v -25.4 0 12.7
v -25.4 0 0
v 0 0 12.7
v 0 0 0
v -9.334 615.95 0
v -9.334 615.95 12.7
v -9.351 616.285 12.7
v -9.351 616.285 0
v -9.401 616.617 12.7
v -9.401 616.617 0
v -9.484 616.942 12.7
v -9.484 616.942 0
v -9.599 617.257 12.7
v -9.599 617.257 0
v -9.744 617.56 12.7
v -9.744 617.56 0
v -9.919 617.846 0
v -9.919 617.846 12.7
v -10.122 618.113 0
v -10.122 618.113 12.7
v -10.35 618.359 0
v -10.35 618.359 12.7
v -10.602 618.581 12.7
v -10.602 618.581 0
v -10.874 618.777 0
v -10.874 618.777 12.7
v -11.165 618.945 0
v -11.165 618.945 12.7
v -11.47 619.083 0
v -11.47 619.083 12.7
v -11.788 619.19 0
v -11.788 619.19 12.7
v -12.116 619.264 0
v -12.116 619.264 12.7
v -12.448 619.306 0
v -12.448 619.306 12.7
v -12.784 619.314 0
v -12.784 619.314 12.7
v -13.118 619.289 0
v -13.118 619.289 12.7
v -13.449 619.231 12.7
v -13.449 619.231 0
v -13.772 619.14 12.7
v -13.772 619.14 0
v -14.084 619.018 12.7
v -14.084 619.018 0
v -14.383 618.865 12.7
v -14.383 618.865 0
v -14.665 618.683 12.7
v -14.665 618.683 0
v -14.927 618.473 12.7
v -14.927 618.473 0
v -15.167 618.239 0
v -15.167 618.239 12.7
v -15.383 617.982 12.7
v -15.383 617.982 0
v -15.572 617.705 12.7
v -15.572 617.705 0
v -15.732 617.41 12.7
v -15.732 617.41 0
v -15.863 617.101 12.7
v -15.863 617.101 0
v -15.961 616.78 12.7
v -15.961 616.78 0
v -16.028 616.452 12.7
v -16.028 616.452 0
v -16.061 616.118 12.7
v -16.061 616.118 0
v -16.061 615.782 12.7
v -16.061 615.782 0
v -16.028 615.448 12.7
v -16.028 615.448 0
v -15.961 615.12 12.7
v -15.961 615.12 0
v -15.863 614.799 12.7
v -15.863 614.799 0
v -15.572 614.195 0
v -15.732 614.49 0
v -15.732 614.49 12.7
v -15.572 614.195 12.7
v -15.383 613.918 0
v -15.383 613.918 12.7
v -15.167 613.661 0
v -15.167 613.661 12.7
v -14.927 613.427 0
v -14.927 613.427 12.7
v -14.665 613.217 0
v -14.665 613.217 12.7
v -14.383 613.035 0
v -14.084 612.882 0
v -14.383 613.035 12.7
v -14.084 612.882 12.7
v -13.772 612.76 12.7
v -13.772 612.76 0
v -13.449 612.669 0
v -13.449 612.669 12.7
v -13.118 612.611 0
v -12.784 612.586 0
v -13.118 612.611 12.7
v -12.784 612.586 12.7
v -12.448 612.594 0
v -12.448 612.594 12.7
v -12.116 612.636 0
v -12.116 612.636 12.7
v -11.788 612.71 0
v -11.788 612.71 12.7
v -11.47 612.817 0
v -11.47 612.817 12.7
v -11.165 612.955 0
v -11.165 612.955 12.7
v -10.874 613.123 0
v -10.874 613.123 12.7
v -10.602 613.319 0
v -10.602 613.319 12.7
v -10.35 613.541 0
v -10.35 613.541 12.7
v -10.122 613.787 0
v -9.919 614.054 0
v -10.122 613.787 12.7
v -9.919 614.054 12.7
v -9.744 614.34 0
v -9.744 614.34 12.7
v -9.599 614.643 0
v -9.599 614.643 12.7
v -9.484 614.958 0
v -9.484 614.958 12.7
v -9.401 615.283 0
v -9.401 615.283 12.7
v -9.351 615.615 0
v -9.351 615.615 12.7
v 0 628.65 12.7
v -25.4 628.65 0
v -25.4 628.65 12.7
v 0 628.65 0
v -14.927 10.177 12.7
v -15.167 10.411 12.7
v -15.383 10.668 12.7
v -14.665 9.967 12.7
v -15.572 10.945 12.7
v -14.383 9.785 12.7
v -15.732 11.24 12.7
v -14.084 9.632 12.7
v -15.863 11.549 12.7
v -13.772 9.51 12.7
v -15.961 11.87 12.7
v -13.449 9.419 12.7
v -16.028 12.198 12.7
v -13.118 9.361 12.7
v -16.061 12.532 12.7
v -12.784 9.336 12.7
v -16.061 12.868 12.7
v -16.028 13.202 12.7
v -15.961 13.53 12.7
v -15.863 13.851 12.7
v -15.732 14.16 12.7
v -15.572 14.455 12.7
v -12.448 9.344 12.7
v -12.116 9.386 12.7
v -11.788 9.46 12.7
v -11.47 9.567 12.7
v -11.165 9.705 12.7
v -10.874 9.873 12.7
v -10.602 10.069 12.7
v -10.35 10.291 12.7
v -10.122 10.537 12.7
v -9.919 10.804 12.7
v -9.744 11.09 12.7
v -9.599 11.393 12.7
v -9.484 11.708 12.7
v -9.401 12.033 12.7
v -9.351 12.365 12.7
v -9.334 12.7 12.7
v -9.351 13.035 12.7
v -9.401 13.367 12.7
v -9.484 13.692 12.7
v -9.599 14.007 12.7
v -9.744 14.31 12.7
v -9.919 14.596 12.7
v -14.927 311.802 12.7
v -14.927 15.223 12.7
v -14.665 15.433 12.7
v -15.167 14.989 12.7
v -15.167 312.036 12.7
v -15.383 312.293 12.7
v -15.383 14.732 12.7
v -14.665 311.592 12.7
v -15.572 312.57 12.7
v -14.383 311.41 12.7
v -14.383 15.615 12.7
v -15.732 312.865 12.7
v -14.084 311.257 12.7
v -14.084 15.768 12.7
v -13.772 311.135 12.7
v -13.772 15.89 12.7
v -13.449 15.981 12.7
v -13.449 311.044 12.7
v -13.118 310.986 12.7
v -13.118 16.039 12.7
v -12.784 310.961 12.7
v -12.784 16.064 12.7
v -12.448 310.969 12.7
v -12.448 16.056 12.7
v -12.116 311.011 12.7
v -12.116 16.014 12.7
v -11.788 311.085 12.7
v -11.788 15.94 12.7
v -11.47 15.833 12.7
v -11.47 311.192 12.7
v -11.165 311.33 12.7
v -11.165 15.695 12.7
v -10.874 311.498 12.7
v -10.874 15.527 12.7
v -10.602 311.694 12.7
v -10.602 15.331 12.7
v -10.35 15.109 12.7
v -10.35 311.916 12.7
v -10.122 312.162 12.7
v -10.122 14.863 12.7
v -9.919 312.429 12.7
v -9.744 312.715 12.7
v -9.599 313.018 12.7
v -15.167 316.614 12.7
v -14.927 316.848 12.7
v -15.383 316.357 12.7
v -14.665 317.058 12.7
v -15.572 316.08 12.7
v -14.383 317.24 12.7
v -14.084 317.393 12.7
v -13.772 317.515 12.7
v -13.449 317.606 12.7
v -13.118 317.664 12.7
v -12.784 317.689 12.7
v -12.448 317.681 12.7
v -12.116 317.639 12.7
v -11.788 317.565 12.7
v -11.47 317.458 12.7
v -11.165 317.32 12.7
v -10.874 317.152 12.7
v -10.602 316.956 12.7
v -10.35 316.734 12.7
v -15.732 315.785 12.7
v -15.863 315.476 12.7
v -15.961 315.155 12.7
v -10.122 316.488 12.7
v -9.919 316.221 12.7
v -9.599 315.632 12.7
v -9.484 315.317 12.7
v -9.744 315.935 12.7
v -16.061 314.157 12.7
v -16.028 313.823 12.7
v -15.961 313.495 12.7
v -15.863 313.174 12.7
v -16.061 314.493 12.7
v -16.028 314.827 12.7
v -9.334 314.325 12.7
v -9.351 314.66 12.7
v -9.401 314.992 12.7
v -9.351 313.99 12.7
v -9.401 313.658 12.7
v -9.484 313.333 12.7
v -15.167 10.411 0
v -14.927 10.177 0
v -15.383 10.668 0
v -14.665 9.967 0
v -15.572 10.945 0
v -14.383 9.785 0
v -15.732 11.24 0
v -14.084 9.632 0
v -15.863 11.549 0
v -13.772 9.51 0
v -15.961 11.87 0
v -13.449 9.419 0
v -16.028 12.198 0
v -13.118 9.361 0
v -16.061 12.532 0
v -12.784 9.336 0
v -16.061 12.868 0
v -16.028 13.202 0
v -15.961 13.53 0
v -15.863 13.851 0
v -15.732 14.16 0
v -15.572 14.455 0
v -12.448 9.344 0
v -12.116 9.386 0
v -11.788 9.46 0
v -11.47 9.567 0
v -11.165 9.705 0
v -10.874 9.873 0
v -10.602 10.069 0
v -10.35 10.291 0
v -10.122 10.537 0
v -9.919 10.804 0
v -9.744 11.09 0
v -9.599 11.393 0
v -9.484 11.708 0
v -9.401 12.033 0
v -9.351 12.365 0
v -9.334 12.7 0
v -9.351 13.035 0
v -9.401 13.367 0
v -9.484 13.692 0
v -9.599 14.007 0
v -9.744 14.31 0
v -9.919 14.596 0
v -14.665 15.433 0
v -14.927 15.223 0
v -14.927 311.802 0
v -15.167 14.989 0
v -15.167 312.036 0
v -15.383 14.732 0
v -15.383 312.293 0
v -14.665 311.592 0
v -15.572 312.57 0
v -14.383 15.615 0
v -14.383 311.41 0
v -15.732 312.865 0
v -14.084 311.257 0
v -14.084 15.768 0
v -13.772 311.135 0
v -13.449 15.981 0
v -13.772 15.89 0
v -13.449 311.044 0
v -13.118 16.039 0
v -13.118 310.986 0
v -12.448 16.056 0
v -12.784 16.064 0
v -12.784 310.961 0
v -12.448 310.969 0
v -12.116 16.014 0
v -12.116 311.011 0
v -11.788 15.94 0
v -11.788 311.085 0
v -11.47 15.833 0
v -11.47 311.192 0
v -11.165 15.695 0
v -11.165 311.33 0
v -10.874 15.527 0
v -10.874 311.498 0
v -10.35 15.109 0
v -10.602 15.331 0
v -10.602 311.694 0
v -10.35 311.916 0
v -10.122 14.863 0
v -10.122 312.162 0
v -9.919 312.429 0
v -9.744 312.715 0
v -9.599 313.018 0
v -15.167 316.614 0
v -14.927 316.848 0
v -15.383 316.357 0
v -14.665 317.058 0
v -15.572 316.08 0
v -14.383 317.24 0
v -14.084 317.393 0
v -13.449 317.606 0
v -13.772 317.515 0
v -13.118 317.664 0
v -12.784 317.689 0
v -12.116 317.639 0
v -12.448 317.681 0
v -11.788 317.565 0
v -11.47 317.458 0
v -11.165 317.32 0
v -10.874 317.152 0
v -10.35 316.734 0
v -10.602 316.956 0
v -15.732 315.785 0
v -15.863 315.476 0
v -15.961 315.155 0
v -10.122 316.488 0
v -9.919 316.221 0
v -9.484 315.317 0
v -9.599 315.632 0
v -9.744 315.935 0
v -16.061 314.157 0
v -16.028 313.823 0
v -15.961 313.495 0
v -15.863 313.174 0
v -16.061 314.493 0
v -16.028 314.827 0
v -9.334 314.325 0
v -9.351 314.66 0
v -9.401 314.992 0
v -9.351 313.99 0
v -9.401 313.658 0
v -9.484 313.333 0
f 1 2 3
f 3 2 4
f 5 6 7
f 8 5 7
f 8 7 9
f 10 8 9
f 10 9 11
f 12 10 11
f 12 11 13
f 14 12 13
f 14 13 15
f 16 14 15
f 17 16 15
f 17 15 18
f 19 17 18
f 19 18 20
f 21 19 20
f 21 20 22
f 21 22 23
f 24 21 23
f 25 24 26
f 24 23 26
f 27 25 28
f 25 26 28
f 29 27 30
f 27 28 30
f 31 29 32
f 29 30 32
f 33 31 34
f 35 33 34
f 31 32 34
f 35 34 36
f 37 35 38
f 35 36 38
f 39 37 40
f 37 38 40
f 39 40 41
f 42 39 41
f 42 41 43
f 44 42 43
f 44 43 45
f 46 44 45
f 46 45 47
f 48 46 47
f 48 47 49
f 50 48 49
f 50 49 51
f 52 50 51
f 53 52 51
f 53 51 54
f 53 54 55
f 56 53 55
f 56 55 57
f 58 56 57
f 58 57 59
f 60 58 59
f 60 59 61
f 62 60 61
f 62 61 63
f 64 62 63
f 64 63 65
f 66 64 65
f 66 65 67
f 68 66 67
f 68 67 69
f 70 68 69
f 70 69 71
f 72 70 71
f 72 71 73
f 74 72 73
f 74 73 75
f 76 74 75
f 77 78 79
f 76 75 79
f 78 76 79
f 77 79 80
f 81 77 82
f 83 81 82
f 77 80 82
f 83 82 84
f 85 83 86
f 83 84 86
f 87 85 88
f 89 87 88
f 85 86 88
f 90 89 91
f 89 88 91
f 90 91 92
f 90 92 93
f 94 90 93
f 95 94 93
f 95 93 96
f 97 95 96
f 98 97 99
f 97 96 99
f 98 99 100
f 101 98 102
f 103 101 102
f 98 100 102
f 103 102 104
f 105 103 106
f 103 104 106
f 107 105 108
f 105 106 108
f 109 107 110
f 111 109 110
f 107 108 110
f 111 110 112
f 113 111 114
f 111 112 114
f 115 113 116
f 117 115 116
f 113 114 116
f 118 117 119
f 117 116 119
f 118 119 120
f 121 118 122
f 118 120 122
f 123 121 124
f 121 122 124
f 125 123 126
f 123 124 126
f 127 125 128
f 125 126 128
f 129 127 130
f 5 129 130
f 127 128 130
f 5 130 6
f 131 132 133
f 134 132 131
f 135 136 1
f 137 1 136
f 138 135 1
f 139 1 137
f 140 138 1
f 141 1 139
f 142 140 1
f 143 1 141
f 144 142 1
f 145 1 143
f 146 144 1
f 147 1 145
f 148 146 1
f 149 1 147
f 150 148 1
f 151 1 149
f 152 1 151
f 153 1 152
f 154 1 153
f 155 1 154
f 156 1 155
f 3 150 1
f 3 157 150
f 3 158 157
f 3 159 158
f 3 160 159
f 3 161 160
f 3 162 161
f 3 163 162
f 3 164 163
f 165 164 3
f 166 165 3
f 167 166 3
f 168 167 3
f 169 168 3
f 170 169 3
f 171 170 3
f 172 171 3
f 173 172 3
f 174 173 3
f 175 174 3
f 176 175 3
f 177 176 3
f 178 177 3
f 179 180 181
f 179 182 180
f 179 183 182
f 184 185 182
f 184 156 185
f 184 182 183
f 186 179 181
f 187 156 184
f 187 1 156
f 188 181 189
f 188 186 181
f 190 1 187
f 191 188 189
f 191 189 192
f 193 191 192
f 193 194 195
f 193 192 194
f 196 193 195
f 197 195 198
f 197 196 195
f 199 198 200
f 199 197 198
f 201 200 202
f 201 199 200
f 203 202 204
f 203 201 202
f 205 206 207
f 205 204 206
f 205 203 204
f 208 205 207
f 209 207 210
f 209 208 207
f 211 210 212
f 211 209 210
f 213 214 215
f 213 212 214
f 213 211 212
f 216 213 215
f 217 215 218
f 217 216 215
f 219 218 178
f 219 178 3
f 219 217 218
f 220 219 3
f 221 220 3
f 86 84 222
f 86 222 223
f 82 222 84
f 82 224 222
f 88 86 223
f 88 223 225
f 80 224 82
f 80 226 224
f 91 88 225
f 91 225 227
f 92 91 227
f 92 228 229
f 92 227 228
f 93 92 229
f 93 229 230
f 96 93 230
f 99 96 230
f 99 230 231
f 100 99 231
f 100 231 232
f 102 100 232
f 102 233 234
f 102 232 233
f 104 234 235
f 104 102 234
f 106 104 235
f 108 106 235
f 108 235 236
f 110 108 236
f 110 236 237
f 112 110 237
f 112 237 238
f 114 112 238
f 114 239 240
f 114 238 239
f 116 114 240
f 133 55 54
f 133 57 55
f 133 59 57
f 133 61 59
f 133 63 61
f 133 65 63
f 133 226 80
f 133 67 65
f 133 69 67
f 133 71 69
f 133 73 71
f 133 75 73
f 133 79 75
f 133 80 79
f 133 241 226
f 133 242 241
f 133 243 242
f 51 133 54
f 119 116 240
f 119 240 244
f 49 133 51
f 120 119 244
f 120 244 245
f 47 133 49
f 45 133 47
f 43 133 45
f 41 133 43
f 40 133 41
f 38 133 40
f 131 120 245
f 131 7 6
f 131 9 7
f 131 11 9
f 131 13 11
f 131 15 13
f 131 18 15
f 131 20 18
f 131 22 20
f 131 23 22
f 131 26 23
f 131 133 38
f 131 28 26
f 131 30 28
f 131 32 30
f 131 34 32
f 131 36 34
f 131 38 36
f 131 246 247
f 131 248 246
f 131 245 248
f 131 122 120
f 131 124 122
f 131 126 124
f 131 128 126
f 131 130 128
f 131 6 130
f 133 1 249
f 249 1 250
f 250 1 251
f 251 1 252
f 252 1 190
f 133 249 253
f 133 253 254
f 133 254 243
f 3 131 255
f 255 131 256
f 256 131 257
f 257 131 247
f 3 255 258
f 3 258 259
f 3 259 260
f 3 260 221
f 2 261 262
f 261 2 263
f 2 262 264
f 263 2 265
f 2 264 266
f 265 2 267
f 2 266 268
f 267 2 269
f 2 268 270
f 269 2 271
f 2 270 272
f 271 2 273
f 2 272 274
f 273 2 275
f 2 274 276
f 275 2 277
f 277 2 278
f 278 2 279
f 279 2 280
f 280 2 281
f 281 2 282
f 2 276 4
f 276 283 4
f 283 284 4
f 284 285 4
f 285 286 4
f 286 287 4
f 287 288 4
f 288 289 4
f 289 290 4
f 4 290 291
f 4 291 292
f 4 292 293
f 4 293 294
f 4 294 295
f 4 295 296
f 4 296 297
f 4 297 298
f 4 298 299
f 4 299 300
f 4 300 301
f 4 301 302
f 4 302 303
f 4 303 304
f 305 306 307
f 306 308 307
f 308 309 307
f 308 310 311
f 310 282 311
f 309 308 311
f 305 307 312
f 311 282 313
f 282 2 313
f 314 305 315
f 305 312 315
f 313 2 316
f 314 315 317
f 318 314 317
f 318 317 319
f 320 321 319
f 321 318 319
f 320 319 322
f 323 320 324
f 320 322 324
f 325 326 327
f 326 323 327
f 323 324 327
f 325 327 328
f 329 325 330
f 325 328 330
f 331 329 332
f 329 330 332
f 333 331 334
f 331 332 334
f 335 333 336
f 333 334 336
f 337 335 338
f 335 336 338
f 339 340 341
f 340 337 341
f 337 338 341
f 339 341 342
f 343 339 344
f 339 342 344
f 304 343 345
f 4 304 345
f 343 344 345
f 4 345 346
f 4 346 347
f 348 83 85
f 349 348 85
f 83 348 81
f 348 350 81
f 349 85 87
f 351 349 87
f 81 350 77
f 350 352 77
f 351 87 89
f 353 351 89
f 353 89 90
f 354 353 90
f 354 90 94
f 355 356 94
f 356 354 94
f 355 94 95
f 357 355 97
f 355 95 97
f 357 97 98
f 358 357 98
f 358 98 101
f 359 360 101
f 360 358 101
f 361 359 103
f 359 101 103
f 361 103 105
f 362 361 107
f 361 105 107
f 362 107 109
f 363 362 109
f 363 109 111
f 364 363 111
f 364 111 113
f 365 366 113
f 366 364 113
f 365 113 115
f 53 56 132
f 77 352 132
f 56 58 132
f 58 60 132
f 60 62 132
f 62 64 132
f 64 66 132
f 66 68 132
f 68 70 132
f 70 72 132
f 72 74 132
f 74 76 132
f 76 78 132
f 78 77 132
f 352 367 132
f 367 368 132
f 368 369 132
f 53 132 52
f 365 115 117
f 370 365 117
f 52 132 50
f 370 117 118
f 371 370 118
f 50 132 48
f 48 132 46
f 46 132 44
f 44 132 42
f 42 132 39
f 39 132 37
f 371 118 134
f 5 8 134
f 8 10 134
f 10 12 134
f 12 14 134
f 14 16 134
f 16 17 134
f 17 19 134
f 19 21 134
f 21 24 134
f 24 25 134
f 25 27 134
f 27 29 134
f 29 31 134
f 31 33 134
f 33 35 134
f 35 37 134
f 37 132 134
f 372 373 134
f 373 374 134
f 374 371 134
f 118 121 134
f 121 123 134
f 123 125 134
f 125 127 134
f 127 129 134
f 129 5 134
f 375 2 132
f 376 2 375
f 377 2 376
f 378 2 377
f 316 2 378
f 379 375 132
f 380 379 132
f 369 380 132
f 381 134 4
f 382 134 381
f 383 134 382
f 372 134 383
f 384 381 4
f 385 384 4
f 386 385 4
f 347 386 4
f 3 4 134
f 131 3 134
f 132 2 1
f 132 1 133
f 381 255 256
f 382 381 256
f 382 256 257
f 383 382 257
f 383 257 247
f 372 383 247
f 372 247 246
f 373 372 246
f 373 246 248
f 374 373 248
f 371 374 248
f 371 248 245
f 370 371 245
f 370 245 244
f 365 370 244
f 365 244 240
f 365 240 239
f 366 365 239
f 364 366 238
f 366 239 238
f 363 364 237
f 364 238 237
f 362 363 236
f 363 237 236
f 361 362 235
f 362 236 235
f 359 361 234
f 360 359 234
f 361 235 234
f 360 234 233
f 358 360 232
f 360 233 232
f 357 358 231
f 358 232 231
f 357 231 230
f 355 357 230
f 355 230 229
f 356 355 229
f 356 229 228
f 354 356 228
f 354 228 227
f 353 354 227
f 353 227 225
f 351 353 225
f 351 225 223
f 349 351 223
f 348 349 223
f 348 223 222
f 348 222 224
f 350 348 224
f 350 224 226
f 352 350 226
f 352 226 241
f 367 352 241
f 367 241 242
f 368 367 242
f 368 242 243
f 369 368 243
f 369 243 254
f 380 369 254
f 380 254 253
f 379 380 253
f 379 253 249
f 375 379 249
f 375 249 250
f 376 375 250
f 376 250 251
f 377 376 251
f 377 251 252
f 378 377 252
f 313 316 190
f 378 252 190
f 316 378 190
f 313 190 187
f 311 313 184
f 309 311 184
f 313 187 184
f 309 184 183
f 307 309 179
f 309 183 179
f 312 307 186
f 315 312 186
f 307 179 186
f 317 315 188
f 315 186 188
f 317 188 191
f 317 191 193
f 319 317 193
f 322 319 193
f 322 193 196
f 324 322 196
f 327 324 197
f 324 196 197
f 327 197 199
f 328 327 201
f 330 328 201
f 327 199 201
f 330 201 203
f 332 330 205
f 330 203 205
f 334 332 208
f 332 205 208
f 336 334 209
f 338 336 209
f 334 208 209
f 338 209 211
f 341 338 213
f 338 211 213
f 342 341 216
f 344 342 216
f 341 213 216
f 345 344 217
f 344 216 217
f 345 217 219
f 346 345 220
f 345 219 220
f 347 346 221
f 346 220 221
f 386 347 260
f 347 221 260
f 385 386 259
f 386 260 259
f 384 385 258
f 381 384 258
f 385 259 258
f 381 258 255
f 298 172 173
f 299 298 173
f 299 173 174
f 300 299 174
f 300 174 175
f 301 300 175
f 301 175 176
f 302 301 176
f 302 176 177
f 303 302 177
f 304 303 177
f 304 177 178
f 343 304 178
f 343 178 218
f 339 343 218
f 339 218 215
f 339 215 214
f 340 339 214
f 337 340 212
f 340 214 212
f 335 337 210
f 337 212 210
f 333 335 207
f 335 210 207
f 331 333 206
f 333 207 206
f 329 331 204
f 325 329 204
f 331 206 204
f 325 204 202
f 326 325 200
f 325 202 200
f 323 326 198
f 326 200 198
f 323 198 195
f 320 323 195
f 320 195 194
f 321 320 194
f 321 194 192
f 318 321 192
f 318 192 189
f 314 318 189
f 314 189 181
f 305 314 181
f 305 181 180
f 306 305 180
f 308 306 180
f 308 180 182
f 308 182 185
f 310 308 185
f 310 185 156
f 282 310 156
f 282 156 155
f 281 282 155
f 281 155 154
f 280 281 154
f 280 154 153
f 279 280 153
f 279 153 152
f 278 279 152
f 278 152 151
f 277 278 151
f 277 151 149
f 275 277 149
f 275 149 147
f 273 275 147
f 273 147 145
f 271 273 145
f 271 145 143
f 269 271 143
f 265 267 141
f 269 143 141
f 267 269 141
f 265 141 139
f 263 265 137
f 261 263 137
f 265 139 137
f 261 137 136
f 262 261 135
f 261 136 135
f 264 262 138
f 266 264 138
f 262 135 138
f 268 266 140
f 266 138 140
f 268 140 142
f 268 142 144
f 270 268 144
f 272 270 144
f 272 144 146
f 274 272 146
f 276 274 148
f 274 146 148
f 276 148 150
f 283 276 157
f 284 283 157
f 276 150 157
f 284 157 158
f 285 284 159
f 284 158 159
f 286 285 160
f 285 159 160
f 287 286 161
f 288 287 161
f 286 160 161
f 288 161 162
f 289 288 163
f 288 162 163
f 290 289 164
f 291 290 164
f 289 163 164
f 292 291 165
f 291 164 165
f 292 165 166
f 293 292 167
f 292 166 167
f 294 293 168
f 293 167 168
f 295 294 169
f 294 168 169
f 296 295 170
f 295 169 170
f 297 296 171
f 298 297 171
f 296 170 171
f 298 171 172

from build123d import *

# Parameters (mm, degrees)
SKETCH1_W           = 25.4
SKETCH1_H           = 628.65
BOSS_EXTRUDE1_DEPTH = 12.7
SKETCH2_R           = 3.3655
CUT_EXTRUDE1_DEPTH  = 13.7
LPATTERN1_COUNT     = 3
LPATTERN1_PITCH     = 301.625


with BuildPart() as part:
    # Sketch1 → Boss-Extrude1 (new body)
    with BuildSketch(Plane.XY):
        with Locations((-12.7, 314.325)):
            Rectangle(SKETCH1_W, SKETCH1_H)
    extrude(amount=BOSS_EXTRUDE1_DEPTH)

    # Sketch2 → Cut-Extrude1 (cut, through all)
    with BuildSketch(Plane.XY.offset(12.7)):
        with Locations((-12.7, 12.7)):
            Circle(SKETCH2_R)
    cut_extrude1 = extrude(amount=-CUT_EXTRUDE1_DEPTH, mode=Mode.SUBTRACT)

    # LPattern1: Cut-Extrude1 ×3
    with Locations(*[(0, i * LPATTERN1_PITCH, 0) for i in range(1, LPATTERN1_COUNT)]):
        add(cut_extrude1, mode=Mode.SUBTRACT)


solid = part.part
